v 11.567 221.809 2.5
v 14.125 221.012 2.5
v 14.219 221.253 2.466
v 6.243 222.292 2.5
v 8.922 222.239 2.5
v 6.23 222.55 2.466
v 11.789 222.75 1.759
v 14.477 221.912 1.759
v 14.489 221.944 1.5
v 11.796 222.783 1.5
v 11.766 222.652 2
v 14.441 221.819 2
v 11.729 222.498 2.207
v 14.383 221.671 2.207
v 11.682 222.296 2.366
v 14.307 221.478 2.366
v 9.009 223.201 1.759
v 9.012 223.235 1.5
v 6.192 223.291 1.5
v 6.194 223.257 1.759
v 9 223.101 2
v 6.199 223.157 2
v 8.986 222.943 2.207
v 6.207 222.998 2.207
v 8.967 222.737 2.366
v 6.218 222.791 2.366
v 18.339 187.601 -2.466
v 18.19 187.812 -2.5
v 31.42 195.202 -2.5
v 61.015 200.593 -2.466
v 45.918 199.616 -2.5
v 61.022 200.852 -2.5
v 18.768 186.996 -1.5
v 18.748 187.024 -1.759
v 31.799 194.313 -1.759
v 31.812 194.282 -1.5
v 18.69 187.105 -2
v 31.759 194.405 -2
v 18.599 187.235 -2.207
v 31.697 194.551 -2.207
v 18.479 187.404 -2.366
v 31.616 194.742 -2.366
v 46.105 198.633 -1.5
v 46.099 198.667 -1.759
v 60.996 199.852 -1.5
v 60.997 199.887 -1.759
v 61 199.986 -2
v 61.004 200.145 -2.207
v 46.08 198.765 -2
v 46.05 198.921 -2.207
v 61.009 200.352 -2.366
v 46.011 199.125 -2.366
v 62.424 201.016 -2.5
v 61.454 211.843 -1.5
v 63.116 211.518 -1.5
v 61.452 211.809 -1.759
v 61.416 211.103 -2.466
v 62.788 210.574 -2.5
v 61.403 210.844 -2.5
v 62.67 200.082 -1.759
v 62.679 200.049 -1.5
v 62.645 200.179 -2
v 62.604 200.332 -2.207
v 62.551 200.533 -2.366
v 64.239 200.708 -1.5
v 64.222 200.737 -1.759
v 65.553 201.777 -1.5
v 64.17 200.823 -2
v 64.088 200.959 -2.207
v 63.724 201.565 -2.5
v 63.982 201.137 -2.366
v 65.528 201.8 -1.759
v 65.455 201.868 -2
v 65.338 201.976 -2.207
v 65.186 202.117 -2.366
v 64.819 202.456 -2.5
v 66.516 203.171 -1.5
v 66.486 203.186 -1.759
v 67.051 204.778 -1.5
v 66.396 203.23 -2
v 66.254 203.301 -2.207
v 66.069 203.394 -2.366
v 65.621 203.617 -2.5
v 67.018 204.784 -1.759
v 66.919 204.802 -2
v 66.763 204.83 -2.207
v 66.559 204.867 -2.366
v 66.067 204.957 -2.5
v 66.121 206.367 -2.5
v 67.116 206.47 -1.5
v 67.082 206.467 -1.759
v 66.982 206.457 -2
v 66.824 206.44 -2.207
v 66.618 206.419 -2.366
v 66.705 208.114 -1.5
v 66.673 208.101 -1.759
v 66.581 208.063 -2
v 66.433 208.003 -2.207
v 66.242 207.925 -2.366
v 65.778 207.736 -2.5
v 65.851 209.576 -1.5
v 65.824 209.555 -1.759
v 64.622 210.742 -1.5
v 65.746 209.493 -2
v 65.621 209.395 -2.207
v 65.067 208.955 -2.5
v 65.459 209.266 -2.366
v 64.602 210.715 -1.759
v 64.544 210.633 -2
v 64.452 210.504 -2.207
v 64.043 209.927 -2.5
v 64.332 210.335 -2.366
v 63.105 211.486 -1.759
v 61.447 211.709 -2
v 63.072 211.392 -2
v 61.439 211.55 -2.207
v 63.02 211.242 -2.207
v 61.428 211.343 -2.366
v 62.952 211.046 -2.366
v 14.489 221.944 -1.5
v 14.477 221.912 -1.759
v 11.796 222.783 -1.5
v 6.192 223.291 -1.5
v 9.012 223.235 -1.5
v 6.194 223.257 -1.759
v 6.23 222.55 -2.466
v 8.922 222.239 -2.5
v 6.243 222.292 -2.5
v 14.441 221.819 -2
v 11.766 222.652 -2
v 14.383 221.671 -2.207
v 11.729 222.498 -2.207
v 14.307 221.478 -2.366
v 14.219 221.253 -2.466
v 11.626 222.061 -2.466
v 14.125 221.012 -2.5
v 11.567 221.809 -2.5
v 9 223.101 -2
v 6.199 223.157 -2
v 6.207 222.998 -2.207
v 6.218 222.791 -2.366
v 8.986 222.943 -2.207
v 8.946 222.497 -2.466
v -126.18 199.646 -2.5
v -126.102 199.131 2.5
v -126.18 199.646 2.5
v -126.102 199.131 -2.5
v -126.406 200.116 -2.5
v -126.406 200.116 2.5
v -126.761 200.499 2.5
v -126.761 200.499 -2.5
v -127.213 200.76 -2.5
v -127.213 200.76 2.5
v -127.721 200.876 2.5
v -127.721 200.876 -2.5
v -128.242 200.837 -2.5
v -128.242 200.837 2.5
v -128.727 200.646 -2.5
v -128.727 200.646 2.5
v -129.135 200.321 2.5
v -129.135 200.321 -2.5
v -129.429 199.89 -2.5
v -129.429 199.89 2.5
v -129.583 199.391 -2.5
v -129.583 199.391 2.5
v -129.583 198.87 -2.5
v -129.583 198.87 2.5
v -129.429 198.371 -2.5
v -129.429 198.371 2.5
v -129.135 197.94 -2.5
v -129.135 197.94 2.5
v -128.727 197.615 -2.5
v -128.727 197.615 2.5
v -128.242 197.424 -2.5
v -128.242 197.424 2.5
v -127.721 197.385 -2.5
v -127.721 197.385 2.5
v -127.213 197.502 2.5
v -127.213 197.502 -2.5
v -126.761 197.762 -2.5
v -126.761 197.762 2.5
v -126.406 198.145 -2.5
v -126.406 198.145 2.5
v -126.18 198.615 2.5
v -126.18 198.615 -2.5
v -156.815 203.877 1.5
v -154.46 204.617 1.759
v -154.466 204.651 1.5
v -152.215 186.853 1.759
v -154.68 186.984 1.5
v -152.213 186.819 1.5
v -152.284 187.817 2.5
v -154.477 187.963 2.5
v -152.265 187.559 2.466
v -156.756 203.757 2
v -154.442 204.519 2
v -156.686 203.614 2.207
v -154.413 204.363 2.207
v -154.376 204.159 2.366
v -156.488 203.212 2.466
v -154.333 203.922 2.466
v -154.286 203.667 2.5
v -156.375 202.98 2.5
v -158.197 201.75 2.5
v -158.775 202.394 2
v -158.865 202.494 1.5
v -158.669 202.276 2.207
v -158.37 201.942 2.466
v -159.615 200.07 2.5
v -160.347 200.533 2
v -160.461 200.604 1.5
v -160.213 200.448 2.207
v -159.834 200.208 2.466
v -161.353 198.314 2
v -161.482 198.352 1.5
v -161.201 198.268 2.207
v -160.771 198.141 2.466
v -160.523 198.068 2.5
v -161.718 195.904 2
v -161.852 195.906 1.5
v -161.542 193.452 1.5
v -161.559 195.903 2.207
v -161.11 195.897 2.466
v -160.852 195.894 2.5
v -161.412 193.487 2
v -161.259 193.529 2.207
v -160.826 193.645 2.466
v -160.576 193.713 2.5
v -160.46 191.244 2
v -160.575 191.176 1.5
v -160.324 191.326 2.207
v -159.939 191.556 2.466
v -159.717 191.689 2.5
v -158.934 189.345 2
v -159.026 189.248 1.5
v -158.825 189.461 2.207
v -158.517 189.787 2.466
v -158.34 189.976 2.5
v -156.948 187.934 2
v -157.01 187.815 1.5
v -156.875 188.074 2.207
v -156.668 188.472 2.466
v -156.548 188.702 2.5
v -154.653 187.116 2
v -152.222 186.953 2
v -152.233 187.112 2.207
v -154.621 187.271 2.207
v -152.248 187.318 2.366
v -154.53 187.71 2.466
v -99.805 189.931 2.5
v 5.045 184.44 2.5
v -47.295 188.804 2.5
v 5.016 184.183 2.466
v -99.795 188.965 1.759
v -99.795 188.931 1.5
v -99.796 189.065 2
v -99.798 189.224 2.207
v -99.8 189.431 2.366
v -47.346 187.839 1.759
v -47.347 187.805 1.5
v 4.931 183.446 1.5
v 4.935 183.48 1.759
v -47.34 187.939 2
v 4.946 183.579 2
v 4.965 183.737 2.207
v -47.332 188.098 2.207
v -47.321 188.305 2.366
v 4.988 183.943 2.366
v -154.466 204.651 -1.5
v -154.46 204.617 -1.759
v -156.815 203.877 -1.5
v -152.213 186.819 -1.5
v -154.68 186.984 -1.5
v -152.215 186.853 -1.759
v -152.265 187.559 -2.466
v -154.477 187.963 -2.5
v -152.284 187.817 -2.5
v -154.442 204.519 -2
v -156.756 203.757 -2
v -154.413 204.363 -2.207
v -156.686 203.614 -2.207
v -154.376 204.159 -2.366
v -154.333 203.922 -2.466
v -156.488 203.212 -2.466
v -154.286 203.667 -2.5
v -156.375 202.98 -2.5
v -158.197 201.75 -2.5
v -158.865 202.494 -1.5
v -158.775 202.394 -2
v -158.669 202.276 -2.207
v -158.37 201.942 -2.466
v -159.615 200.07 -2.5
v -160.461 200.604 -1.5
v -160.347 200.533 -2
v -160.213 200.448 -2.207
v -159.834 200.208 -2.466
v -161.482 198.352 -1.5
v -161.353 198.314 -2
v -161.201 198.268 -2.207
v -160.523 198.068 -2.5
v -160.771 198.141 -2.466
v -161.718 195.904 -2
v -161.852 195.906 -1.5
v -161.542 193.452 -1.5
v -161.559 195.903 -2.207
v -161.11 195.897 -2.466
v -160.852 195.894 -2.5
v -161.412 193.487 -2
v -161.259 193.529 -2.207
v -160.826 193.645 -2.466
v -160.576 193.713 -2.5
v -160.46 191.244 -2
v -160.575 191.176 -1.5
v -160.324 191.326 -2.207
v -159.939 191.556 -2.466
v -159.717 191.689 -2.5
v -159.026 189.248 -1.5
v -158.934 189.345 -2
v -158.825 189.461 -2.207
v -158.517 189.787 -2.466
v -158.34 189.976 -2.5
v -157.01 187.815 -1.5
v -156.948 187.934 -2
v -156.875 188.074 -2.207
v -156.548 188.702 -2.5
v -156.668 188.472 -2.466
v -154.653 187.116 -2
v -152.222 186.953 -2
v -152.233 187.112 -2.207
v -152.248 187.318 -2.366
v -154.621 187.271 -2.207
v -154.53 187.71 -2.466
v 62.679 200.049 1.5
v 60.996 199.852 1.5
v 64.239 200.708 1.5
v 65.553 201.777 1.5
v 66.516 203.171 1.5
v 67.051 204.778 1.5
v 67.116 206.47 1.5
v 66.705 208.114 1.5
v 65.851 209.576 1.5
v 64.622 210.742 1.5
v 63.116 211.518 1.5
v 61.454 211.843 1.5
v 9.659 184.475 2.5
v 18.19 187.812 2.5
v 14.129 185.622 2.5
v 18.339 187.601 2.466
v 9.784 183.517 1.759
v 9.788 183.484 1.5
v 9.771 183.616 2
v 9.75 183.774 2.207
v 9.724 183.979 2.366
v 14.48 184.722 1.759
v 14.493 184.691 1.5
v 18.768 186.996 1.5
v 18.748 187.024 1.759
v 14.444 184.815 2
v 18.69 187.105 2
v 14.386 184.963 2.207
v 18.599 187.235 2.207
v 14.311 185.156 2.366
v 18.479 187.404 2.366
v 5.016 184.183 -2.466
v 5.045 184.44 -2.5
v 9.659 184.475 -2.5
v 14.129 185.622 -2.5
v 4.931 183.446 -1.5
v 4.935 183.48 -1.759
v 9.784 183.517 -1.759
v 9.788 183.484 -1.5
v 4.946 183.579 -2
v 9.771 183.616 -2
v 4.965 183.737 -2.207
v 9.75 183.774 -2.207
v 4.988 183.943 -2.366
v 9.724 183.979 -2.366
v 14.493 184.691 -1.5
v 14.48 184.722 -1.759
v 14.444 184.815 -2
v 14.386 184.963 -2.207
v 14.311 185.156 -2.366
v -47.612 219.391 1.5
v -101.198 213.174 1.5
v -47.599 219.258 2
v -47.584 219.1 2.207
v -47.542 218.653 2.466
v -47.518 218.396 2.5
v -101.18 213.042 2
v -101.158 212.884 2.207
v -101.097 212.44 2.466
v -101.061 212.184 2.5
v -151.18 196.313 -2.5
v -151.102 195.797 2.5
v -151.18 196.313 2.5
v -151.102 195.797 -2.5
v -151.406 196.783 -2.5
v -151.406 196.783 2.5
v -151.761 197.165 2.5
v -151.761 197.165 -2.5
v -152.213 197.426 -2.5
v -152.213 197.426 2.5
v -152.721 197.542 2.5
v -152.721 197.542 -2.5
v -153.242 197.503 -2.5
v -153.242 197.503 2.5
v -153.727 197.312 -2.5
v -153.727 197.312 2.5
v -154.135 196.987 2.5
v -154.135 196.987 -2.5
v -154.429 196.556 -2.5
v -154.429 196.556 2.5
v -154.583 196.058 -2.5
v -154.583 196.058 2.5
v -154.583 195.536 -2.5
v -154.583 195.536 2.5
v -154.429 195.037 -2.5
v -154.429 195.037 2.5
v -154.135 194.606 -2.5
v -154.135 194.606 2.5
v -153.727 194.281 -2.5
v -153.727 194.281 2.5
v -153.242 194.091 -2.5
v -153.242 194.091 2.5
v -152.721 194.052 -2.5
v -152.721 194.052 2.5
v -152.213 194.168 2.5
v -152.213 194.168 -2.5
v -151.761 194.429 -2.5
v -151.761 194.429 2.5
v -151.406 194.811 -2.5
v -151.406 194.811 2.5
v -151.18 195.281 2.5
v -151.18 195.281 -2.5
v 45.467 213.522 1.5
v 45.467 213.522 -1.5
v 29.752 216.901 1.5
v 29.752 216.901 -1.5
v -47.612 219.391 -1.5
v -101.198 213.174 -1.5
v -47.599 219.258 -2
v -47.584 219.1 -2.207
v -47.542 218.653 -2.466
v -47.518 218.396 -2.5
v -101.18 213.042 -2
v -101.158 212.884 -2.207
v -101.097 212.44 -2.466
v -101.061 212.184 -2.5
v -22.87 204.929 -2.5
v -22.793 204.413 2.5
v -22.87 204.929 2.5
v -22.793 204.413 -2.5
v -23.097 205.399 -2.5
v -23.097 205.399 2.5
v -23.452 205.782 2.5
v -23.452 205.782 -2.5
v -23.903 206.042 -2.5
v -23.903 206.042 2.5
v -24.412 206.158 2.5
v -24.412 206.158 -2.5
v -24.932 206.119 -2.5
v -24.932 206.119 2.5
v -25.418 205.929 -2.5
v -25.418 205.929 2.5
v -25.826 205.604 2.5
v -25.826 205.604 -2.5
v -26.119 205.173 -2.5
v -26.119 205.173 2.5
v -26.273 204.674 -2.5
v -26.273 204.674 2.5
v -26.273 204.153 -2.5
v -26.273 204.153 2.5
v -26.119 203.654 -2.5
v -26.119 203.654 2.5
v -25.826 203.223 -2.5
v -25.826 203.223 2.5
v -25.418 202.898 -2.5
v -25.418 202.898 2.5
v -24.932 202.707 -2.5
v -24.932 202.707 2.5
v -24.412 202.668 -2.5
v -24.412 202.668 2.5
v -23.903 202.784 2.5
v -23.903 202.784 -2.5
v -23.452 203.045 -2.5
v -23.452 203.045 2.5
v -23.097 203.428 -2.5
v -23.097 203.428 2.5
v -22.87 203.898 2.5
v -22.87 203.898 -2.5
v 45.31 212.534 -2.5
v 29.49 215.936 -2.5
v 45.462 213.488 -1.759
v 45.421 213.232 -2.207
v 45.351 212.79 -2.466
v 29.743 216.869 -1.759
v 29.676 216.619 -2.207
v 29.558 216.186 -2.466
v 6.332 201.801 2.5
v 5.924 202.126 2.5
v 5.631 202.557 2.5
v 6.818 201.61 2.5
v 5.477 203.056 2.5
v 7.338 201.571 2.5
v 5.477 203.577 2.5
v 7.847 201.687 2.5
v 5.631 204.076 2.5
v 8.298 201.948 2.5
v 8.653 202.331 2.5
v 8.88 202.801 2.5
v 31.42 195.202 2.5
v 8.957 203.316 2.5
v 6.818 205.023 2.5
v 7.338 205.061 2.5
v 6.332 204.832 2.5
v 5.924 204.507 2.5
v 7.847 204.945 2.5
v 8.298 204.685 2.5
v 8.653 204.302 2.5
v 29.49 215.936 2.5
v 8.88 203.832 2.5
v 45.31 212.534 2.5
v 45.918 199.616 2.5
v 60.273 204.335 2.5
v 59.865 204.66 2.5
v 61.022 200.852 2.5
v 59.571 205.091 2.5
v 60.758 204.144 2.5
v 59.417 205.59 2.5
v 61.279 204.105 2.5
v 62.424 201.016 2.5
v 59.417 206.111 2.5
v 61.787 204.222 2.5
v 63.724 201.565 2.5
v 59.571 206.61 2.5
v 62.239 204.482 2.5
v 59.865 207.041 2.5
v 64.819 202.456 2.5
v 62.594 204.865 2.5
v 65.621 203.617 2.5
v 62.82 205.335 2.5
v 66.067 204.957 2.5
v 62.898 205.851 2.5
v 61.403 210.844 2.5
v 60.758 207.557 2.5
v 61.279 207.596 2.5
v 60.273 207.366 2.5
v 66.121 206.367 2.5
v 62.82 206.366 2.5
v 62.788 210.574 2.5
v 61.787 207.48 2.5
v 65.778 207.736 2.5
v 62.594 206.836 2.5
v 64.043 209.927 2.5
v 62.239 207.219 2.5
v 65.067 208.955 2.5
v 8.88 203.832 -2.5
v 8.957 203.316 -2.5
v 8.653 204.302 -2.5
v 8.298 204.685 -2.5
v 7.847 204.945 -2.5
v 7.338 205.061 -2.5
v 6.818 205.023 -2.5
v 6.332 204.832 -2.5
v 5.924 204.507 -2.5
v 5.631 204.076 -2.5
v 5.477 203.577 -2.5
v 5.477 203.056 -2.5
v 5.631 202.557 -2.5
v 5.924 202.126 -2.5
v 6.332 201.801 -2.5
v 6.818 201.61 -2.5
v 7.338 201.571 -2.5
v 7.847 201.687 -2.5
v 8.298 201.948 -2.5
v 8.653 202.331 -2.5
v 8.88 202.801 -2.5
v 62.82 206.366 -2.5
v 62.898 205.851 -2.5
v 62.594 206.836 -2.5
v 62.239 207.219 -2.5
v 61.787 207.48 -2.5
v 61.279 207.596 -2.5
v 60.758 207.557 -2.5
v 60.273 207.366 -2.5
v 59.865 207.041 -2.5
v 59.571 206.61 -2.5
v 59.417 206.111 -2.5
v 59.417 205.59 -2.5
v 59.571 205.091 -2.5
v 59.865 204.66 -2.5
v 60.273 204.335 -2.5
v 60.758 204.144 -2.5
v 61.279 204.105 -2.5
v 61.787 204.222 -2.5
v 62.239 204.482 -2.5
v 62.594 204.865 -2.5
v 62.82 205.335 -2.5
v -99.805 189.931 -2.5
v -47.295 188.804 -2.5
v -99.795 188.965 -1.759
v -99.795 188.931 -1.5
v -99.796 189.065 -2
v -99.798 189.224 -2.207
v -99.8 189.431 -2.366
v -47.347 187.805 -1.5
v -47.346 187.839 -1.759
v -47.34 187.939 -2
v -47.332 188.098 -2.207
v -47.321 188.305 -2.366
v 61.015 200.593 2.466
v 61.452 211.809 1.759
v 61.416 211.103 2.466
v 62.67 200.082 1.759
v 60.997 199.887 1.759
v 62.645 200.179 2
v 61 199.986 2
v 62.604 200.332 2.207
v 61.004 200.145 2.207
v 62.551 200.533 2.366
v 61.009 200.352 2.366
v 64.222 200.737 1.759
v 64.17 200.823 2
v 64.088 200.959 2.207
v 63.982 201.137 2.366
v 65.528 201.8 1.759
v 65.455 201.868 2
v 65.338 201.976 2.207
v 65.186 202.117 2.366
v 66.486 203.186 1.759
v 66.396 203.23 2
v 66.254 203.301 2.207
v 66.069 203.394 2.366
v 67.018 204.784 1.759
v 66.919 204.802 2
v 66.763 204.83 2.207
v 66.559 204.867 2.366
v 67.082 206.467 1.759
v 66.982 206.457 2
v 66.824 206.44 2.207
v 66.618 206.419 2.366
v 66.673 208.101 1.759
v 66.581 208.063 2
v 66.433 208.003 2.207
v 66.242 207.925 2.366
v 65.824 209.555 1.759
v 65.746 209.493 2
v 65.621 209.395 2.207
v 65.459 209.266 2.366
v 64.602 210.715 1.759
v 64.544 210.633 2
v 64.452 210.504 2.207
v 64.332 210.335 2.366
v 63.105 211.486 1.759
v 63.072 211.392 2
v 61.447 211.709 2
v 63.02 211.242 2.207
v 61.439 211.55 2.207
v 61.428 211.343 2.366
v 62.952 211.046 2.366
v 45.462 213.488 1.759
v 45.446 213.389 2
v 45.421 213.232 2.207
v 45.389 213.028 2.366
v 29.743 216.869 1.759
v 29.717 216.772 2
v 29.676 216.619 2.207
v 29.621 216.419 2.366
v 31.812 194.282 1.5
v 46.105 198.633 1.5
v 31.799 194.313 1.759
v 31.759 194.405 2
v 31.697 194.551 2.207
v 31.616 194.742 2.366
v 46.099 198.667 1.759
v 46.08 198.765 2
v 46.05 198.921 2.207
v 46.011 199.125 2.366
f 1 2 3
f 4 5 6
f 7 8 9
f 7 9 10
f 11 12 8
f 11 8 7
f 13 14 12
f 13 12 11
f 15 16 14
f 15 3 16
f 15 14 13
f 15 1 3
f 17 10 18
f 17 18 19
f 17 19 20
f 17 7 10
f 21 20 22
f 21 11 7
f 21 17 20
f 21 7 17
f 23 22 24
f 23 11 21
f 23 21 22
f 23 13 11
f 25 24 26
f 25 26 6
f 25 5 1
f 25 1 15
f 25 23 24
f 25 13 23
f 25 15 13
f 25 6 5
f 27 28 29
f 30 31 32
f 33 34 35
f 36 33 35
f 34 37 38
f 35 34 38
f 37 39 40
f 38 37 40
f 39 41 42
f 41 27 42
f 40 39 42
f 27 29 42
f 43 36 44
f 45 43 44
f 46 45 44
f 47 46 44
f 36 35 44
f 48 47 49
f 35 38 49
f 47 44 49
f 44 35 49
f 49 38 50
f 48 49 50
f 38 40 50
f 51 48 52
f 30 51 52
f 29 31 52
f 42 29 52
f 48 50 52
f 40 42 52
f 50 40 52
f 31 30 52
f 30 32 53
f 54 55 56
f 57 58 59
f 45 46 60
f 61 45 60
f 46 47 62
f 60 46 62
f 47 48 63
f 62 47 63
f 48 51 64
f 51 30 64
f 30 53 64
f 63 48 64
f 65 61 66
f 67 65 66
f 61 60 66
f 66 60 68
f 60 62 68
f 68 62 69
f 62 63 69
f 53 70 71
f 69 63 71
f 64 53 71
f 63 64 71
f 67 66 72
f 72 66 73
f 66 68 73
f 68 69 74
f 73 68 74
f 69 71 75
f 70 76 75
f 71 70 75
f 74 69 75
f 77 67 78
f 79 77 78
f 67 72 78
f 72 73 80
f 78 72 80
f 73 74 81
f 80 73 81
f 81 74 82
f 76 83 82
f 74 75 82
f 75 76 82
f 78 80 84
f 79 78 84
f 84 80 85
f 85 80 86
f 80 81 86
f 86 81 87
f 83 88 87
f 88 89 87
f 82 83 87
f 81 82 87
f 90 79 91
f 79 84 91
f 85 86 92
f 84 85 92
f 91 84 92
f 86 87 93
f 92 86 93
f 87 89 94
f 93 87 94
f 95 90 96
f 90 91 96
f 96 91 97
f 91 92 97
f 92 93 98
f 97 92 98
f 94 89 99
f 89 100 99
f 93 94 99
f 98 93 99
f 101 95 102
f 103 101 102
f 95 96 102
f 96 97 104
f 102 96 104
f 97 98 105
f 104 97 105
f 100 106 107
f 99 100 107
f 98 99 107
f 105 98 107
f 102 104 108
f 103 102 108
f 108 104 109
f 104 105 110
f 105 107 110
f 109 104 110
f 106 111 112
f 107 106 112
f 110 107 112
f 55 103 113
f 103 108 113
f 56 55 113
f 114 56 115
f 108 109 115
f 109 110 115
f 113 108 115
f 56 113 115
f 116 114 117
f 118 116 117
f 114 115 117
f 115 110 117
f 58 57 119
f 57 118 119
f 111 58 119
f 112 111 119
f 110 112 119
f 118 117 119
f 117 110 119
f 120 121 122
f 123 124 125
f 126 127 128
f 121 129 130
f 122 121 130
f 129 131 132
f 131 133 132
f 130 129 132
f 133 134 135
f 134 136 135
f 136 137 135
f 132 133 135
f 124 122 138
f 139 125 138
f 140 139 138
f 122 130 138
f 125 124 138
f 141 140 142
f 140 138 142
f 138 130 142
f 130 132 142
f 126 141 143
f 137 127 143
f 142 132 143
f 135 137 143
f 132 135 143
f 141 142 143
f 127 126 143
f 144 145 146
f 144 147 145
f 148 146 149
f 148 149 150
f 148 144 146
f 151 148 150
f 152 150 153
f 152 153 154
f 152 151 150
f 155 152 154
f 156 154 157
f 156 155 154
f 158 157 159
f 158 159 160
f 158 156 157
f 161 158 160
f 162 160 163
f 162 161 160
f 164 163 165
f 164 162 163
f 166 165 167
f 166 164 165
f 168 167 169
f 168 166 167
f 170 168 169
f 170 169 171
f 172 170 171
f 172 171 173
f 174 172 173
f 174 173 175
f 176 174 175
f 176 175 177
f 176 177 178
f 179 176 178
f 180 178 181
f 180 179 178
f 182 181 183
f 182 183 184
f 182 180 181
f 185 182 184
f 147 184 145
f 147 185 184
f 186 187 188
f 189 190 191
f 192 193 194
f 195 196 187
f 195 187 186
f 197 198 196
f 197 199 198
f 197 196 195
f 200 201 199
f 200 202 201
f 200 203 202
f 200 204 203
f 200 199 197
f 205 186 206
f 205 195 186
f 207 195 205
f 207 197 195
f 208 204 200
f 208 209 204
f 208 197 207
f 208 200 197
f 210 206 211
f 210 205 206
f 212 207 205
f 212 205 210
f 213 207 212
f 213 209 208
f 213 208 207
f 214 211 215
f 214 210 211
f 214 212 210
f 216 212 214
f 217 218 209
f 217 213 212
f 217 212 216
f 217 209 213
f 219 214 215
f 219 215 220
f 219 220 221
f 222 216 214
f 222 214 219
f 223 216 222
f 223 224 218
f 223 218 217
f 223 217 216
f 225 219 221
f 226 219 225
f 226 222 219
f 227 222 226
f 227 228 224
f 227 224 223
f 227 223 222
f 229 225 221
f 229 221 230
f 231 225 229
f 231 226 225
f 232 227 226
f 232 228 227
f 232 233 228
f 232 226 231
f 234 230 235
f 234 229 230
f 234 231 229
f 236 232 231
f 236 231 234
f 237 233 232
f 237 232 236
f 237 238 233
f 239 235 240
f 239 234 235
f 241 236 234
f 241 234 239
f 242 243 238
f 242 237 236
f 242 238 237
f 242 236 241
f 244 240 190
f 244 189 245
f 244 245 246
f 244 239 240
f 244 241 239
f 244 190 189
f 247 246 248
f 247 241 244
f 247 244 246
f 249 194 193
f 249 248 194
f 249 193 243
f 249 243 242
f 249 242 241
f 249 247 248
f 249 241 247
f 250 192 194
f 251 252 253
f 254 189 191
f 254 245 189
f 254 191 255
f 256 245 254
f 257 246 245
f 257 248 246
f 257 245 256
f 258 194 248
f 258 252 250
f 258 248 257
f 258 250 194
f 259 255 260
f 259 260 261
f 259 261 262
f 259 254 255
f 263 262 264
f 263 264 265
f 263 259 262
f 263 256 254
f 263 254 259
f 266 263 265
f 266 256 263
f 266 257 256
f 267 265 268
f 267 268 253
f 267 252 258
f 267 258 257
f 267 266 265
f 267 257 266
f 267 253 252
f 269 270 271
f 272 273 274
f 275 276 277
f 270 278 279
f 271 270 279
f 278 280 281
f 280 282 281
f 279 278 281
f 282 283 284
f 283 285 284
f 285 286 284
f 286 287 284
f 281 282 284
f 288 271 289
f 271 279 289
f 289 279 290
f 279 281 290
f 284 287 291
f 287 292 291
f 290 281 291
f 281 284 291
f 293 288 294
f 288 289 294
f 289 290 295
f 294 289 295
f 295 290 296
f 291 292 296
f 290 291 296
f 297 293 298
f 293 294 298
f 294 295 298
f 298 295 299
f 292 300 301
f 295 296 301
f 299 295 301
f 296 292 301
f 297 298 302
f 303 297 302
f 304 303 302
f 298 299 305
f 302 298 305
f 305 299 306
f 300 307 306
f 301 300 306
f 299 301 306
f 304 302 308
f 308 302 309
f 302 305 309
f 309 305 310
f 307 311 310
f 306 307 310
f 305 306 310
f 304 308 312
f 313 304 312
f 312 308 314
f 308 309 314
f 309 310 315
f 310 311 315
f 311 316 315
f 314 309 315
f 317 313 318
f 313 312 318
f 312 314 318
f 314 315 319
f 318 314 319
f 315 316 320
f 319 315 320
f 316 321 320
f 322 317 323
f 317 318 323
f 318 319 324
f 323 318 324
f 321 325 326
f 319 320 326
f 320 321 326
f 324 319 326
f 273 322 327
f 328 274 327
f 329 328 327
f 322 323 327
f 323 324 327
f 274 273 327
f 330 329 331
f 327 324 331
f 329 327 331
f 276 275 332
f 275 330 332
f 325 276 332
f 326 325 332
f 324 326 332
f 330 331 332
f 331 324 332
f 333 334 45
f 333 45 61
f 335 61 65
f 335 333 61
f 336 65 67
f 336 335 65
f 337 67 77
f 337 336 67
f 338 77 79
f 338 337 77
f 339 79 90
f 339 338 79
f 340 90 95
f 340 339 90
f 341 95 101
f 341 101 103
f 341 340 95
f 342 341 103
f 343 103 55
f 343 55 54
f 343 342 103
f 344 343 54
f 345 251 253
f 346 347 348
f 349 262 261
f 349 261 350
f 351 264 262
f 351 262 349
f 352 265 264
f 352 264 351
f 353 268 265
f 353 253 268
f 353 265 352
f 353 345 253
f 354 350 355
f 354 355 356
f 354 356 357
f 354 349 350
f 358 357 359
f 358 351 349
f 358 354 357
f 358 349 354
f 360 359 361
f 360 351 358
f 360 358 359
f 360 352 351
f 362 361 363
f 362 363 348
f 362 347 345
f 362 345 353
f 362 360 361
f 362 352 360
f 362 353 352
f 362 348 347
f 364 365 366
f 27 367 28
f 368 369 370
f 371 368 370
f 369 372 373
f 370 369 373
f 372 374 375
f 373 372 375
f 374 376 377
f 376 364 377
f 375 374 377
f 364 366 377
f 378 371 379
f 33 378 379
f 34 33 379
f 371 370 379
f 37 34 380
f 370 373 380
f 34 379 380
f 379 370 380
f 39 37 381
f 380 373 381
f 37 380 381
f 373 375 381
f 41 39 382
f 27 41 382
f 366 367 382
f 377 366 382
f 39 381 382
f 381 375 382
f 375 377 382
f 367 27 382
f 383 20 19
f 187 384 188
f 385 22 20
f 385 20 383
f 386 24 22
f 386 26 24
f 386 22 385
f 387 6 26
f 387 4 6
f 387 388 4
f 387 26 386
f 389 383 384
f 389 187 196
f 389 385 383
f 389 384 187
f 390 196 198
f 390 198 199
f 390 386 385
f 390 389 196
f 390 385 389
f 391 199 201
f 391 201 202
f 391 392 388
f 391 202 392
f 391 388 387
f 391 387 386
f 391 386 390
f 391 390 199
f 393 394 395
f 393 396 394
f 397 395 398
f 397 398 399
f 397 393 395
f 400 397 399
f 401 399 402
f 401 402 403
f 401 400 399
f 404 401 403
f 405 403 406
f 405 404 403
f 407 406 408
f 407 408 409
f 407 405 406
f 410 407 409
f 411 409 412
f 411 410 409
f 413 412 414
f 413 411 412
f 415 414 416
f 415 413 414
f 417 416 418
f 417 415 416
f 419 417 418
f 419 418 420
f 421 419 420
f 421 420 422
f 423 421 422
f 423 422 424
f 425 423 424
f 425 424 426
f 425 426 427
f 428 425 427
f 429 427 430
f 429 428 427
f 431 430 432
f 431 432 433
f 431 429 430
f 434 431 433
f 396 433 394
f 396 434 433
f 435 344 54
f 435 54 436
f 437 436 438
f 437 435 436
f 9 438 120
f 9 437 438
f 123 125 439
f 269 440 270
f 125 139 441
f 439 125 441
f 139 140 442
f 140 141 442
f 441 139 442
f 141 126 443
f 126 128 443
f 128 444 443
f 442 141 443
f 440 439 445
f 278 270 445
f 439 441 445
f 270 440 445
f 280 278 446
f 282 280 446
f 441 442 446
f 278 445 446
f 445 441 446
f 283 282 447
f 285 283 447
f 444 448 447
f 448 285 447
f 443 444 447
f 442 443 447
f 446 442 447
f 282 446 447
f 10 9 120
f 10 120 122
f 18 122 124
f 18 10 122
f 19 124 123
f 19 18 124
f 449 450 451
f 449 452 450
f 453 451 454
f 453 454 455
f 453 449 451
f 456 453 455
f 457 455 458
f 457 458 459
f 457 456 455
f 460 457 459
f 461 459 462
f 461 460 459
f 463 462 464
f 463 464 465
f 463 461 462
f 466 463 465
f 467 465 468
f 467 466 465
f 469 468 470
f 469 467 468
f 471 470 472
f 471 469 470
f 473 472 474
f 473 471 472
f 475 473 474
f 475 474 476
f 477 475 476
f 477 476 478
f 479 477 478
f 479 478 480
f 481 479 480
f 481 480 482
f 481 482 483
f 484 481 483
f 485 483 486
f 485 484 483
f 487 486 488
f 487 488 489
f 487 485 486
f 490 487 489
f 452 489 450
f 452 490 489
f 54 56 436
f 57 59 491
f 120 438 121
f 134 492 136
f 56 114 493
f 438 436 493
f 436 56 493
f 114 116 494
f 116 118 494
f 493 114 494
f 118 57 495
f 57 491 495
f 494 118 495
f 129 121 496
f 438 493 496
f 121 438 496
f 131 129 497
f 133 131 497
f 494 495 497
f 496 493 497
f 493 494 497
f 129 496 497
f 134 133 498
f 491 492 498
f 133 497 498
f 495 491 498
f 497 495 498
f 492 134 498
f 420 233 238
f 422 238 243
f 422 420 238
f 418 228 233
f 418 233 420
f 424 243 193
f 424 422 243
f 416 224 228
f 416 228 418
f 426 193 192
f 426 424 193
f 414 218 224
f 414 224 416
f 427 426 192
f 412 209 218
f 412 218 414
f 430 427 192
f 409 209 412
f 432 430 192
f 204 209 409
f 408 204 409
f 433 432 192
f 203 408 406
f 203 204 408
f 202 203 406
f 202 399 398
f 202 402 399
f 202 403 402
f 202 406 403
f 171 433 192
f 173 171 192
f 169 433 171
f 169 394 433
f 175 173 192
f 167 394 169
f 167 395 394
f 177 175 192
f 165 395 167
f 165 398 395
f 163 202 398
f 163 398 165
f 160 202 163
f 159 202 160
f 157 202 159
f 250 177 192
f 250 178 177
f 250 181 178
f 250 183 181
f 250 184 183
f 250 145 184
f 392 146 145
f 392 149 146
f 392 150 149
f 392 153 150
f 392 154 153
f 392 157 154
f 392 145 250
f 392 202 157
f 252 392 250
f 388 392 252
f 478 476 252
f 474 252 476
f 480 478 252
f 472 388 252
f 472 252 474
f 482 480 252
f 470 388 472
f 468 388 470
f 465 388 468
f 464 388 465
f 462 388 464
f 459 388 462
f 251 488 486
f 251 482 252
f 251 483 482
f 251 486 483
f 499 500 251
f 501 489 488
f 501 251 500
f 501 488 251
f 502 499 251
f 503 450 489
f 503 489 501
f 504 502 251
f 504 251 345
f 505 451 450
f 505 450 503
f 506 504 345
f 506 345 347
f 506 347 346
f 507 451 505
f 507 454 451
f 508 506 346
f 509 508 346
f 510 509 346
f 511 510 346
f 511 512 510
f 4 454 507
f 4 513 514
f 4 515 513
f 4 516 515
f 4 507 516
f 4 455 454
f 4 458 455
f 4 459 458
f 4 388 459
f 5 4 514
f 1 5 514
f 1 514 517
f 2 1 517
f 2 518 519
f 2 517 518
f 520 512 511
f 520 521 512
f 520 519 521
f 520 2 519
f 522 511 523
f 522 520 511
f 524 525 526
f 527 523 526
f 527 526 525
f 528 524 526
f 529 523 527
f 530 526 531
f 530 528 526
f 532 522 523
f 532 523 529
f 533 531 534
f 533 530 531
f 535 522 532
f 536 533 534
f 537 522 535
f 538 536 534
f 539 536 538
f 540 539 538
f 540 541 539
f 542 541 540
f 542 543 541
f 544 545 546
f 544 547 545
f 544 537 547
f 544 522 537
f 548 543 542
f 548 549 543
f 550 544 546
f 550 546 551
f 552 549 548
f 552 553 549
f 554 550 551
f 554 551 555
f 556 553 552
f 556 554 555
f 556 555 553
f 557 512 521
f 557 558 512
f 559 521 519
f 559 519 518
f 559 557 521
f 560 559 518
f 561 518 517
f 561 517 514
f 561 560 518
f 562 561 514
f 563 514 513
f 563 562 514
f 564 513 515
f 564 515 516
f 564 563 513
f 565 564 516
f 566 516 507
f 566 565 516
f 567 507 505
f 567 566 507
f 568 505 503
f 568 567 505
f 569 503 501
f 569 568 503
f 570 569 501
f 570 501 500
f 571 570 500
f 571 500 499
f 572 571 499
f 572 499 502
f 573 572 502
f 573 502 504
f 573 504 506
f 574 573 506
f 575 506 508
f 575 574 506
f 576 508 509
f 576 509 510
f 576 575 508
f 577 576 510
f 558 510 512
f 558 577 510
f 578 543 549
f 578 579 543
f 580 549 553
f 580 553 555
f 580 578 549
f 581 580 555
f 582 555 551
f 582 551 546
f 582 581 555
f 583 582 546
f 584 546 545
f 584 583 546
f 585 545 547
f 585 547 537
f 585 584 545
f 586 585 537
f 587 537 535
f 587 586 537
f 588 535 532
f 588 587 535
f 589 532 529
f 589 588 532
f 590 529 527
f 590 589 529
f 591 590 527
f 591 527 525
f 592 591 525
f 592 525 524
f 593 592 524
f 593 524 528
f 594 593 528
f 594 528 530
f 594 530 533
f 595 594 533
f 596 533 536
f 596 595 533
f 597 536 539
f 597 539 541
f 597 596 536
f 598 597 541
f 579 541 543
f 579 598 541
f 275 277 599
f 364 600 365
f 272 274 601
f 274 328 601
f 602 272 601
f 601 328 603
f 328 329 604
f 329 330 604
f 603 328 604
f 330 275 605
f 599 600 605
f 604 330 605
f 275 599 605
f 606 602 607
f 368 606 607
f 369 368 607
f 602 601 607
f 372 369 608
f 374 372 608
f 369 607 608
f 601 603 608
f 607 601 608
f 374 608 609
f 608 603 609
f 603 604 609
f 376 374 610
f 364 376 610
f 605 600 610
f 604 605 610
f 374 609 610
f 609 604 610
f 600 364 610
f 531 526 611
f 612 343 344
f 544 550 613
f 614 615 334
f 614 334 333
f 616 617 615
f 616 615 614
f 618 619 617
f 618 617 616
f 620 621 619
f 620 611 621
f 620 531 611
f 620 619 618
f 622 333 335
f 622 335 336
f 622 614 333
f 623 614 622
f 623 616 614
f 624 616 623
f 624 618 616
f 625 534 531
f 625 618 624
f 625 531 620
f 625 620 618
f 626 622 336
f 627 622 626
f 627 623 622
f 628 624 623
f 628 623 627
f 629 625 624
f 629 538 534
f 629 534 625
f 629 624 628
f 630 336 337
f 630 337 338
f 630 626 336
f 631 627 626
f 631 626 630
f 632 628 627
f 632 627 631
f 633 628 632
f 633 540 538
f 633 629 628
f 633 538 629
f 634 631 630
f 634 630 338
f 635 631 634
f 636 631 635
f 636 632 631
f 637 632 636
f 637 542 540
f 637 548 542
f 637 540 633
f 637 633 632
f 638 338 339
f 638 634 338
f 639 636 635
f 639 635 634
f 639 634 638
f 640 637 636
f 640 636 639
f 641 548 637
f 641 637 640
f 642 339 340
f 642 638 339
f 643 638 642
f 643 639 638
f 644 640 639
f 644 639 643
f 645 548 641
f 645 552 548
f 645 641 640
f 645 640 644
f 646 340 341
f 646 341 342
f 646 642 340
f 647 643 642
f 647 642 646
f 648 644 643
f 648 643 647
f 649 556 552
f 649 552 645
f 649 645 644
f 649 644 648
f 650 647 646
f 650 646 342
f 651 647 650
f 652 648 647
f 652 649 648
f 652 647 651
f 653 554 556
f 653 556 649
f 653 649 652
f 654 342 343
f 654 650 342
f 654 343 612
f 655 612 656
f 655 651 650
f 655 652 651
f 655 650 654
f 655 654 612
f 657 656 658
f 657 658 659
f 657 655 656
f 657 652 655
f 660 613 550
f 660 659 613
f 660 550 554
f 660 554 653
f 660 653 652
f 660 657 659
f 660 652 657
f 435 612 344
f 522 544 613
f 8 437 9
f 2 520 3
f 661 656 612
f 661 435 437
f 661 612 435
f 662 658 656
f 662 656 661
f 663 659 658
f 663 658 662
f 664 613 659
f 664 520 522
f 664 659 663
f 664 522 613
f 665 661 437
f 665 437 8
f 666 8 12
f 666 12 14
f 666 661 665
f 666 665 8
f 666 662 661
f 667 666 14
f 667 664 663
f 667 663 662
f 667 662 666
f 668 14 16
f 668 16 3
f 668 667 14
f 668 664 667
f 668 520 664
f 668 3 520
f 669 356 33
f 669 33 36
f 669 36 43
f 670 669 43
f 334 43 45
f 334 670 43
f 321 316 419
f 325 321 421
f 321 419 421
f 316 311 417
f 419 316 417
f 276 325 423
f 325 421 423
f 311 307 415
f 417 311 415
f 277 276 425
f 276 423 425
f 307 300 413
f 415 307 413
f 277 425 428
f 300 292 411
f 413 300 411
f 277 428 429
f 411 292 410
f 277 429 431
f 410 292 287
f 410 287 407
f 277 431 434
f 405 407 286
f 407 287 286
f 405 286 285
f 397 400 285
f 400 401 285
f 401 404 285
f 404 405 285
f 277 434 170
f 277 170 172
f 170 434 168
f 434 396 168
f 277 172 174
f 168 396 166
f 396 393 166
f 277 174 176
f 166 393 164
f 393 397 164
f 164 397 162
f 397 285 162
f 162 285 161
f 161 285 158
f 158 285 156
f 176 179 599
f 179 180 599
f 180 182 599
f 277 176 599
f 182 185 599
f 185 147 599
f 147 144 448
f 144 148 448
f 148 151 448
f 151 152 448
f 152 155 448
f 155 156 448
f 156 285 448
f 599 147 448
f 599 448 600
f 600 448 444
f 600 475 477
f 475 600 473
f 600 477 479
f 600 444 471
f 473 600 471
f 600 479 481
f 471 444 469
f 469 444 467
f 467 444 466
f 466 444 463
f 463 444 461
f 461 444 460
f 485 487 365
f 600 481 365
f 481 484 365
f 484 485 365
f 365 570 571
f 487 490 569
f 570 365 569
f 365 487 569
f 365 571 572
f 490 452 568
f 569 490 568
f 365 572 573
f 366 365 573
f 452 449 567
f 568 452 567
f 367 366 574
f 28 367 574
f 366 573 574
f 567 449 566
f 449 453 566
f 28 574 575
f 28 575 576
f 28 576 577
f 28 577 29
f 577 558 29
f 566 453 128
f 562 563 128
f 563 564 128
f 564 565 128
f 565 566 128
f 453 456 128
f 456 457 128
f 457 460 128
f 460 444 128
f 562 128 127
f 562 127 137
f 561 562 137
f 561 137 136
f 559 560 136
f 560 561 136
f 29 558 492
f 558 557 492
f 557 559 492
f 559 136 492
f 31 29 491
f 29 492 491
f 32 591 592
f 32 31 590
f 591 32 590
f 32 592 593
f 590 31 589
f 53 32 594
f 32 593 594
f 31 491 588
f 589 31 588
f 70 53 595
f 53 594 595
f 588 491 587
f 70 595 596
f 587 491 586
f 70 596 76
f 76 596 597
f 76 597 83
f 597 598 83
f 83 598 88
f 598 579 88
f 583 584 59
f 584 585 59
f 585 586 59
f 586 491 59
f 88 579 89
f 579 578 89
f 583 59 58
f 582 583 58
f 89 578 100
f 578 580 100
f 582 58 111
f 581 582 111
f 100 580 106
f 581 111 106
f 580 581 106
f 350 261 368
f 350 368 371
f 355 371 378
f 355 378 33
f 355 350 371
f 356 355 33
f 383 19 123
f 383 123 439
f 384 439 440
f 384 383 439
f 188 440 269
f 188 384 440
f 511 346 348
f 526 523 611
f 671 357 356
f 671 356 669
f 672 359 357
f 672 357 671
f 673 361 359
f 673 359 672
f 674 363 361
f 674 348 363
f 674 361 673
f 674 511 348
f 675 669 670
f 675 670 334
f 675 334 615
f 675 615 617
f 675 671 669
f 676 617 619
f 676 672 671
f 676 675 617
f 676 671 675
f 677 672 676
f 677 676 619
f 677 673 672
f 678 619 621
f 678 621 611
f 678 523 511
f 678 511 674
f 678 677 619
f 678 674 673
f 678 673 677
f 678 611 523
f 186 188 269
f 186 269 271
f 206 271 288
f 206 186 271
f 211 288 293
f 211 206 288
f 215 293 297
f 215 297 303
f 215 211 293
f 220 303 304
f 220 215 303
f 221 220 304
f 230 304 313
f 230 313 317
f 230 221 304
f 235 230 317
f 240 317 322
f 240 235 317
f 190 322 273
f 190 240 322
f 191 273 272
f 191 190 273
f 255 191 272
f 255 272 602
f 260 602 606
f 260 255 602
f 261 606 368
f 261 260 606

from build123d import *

# Parameters (mm, degrees)
SKETCH2_R           = 1.75
SKETCH2_R_2         = 9
SKETCH2_R_3         = 20
SKETCH2_R_4         = 10
SKETCH2_R_5         = 6
BOSS_EXTRUDE1_DEPTH = 2.5
FILLET1_R           = 1


with BuildPart() as part:
    # Sketch2 → Boss-Extrude1 (new, symmetric)
    # profile 1 of 6: a face of its own
    with BuildSketch(Plane.XY):
        with BuildLine():
            ThreePointArc((4.931171461, 183.44633077), (-12.782697282, 203.949164453), (6.192423965, 223.290625322))
            ThreePointArc((6.192423965, 223.290625322), (-74.438391307, 216.57190759), (-154.465632764, 204.650910815))
            ThreePointArc((-154.465632764, 204.650910815), (-147.086827714, 202.707602973), (-143.852204973, 195.796711203))
            ThreePointArc((-143.852204973, 195.796711203), (-146.265984708, 189.663057919), (-152.212583331, 186.819468634))
            ThreePointArc((-152.212583331, 186.819468634), (-73.562569521, 188.773026517), (4.931171461, 183.44633077))
        make_face()
        with Locations((-127.852204973, 199.130573991)):
            Circle(SKETCH2_R, mode=Mode.SUBTRACT)
        with Locations((-24.542709853, 204.413331435)):
            Circle(SKETCH2_R, mode=Mode.SUBTRACT)
    # profile 2 of 6: a face of its own
    with BuildSketch(Plane.XY):
        with Locations((-152.852204973, 195.796711203)):
            Circle(SKETCH2_R_2)
        with Locations((-152.852204973, 195.796711203)):
            Circle(SKETCH2_R, mode=Mode.SUBTRACT)
    # profile 3 of 6: a face of its own
    with BuildSketch(Plane.XY):
        with Locations((7.207290147, 203.316390753)):
            Circle(SKETCH2_R_3)
        with Locations((7.207290147, 203.316390753)):
            Circle(SKETCH2_R_4, mode=Mode.SUBTRACT)
    # profile 4 of 6: a face of its own
    with BuildSketch(Plane.XY):
        with Locations((7.207290147, 203.316390753)):
            Circle(SKETCH2_R_4)
        with Locations((7.207290147, 203.316390753)):
            Circle(SKETCH2_R, mode=Mode.SUBTRACT)
    # profile 5 of 6: a face of its own
    with BuildSketch(Plane.XY):
        with Locations((61.147795027, 205.850544138)):
            Circle(SKETCH2_R_5)
        with Locations((61.147795027, 205.850544138)):
            Circle(SKETCH2_R, mode=Mode.SUBTRACT)
    # profile 6 of 6: a face of its own
    with BuildSketch(Plane.XY):
        with BuildLine():
            ThreePointArc((14.489310329, 221.943580076), (23.724559953, 214.593792855), (27.207290147, 203.316390753))
            ThreePointArc((27.207290147, 203.316390753), (24.972572156, 194.129728945), (18.767814631, 186.99602698))
            ThreePointArc((18.767814631, 186.99602698), (38.842152118, 196.840042673), (60.99636255, 199.852455425))
            ThreePointArc((60.99636255, 199.852455425), (55.152157086, 206.079292207), (61.453820667, 211.842734748))
            ThreePointArc((61.453820667, 211.842734748), (37.564582261, 215.000863469), (14.489310329, 221.943580076))
        make_face()
    extrude(amount=BOSS_EXTRUDE1_DEPTH, both=True)

    # Fillet1
    fillet1_edges = [part.edges().sort_by_distance(p)[0] for p in [
        (10.412432506, 223.057896837, -2.5),
        (37.564582261, 215.000863469, -2.5),
        (67.143432968, 205.621796069, -2.5),
        (38.842152118, 196.840042673, -2.5),
        (12.177213039, 183.94373305, -2.5),
        (-73.562569521, 188.773026517, -2.5),
        (-161.781211479, 194.66850784, -2.5),
        (-74.438391307, 216.57190759, 2.5),
        (-74.438391307, 216.57190759, -2.5),
        (-161.781211479, 194.66850784, 2.5),
        (-73.562569521, 188.773026517, 2.5),
        (12.177213039, 183.94373305, 2.5),
        (38.842152118, 196.840042673, 2.5),
        (67.143432968, 205.621796069, 2.5),
        (37.564582261, 215.000863469, 2.5),
        (10.412432506, 223.057896837, 2.5),
    ]]
    fillet(fillet1_edges, radius=FILLET1_R)


solid = part.part
